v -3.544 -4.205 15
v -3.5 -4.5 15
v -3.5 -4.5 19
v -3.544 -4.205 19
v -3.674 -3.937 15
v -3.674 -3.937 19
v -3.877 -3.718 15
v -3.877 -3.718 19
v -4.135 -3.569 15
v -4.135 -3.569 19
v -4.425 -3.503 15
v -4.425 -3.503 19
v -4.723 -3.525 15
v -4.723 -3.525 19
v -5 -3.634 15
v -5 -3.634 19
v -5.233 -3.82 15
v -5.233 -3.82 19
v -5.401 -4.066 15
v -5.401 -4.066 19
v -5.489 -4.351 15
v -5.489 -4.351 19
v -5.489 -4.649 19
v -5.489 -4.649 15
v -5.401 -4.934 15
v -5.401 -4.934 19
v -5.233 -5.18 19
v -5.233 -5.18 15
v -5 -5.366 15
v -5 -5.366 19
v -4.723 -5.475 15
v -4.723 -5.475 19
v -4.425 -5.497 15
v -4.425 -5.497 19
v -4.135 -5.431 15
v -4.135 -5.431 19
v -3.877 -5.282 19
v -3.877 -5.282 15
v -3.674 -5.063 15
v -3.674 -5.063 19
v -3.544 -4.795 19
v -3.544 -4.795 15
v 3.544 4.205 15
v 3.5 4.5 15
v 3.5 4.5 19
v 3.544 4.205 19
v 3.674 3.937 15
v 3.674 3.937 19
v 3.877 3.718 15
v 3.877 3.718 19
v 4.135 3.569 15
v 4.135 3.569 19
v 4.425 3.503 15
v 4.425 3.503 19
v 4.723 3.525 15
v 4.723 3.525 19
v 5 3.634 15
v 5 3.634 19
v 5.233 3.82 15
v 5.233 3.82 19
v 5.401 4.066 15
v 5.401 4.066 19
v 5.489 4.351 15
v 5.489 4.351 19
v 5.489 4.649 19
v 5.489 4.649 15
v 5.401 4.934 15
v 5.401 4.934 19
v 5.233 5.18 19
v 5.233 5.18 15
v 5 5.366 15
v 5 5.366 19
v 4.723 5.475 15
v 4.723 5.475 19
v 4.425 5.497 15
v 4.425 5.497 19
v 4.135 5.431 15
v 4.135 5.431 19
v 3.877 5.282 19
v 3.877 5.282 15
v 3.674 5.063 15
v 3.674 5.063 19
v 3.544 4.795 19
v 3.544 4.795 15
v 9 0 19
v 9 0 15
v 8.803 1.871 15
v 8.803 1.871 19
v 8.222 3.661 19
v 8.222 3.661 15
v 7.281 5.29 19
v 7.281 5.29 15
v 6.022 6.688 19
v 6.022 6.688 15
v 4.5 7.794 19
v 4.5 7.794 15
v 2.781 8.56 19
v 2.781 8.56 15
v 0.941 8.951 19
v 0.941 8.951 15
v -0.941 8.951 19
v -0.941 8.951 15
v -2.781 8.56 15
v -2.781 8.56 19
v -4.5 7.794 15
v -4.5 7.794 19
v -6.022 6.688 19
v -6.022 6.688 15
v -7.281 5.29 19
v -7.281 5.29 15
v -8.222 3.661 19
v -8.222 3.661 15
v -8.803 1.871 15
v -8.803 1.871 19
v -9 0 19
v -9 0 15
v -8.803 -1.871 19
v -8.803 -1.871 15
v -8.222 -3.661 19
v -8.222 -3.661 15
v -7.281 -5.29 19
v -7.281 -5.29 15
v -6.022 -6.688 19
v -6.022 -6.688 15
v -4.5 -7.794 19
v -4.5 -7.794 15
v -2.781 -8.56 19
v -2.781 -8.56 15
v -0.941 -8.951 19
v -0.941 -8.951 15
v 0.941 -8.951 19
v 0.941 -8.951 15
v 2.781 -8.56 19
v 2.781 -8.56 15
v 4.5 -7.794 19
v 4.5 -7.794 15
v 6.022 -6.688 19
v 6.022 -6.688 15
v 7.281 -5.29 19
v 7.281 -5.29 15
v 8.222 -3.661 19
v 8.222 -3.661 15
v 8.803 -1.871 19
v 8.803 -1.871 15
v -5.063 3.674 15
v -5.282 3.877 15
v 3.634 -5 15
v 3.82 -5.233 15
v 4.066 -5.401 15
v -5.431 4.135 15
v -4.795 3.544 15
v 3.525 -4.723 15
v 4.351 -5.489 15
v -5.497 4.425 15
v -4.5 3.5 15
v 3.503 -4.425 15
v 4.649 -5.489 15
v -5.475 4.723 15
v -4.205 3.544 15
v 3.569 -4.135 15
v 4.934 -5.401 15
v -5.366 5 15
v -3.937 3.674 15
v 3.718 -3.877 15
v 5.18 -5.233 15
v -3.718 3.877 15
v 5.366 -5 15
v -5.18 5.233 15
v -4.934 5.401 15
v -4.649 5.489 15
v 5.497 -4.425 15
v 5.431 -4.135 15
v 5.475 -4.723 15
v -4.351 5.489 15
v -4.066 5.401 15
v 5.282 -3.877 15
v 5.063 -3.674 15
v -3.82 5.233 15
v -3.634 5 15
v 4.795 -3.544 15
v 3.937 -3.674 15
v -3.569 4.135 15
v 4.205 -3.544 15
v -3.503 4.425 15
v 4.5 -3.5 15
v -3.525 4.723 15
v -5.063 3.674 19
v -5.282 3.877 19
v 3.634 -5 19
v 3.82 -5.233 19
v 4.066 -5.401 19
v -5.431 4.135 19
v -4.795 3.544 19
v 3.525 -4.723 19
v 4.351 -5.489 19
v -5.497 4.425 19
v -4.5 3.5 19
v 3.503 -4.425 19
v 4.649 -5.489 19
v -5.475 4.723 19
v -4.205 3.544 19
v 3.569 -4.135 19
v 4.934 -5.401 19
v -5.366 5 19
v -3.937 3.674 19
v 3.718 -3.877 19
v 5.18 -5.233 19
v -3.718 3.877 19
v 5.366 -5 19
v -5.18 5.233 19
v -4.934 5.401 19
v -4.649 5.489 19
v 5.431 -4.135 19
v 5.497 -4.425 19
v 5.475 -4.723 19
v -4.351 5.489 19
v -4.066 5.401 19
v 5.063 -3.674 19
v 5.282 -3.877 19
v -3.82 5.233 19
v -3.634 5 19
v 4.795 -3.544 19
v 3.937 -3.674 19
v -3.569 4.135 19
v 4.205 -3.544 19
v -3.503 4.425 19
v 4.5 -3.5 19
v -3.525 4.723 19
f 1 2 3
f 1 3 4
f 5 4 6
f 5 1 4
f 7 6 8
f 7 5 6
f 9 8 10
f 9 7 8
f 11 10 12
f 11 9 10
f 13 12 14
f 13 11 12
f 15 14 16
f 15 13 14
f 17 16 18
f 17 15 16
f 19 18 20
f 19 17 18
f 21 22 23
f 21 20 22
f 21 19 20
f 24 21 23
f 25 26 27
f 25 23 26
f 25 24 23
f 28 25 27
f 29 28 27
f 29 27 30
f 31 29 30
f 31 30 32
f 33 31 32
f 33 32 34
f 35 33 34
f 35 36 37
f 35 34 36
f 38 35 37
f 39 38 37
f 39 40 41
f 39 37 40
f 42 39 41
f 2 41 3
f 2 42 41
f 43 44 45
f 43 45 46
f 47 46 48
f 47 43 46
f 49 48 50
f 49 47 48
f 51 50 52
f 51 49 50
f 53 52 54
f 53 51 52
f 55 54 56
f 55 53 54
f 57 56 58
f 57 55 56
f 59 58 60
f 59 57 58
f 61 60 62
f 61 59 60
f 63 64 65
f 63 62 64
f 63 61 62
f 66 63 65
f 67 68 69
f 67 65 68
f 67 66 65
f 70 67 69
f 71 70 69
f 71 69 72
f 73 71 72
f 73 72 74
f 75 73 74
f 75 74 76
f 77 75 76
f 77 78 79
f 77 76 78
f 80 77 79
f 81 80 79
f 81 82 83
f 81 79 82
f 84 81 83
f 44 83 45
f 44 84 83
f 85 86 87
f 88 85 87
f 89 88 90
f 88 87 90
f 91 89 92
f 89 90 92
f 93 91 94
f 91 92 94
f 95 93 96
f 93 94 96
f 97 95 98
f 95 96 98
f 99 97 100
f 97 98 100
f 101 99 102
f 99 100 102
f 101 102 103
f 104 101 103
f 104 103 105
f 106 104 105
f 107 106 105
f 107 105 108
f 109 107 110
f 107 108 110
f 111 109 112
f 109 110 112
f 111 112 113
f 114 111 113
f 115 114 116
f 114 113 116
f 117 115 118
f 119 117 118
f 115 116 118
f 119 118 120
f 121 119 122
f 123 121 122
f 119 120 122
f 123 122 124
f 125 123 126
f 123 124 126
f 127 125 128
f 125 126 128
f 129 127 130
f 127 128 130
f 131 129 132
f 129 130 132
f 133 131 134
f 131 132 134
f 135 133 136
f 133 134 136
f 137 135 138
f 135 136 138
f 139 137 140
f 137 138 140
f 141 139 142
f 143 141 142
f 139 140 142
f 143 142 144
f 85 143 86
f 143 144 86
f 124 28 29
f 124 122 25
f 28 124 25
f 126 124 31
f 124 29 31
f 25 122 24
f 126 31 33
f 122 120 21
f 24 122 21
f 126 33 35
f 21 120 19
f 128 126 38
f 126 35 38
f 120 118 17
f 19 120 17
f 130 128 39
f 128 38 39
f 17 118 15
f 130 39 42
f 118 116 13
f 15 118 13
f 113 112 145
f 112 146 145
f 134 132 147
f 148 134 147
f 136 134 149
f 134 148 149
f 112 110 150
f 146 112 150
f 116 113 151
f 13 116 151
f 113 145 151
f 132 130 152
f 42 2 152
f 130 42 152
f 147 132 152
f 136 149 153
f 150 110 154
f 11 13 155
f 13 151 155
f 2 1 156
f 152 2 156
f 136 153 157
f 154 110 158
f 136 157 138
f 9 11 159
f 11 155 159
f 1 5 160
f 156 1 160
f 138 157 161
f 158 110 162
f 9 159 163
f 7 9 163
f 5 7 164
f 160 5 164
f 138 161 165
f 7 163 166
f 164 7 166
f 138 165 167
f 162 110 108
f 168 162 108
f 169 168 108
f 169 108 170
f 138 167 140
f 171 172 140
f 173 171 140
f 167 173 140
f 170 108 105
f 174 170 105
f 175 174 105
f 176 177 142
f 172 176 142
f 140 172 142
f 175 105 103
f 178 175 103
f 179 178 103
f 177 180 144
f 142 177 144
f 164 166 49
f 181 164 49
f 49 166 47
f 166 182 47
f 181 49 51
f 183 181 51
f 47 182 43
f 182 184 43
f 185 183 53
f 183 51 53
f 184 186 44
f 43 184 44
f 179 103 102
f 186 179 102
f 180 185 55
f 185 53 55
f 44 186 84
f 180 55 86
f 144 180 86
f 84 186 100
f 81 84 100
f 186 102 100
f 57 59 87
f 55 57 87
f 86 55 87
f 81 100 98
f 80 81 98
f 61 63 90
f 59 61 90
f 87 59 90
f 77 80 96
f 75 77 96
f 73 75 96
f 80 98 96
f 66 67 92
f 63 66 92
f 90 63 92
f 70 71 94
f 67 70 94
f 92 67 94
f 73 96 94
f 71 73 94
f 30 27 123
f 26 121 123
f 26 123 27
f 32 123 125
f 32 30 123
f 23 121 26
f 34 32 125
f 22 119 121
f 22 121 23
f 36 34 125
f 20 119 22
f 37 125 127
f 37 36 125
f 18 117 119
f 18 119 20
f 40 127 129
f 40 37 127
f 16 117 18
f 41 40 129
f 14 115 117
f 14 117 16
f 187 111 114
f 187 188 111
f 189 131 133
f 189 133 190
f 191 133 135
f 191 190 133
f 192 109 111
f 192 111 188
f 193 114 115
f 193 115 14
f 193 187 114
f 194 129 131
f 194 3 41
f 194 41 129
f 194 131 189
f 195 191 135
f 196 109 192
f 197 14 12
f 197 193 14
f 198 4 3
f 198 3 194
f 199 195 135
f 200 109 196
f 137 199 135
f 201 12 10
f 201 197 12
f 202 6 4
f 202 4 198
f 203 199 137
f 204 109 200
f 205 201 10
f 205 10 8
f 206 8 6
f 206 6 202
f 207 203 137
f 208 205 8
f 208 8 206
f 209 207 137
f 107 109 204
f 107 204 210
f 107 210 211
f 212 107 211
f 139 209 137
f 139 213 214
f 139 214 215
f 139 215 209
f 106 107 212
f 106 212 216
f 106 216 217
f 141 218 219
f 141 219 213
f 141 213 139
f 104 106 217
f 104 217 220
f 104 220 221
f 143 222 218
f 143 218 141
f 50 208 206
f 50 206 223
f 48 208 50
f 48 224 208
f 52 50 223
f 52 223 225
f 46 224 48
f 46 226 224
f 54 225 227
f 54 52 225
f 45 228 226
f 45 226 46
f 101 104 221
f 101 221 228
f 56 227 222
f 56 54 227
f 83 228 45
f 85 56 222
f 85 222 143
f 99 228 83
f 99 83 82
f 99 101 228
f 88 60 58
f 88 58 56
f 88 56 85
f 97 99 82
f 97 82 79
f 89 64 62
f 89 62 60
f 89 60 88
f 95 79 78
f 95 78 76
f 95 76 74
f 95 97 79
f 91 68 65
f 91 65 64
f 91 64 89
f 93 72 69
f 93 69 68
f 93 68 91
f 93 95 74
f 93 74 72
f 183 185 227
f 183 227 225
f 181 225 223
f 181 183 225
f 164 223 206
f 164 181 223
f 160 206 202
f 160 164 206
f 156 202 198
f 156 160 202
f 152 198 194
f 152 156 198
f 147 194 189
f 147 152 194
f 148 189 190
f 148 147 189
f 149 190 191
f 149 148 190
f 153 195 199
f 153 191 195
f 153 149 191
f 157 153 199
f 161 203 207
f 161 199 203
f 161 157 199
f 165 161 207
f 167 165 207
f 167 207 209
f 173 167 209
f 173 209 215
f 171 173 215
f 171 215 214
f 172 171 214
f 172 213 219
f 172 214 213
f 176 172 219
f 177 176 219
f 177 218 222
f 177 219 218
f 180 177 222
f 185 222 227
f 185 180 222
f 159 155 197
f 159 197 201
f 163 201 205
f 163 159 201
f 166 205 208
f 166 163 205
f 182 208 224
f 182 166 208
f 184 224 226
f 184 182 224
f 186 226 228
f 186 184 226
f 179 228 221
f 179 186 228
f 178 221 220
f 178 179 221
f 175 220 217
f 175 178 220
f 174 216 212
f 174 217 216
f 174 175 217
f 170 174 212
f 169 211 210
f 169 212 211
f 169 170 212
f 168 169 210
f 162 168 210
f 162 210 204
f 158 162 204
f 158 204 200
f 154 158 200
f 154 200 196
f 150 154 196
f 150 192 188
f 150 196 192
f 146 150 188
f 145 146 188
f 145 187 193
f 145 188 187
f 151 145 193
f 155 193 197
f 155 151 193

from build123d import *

# Parameters (mm, degrees)
CYLINDER970_R     = 1
CYLINDER970_DEPTH = 20
CYLINDER971_R     = 1
CYLINDER971_DEPTH = 20
CYLINDER965_R     = 1
CYLINDER965_DEPTH = 20
CYLINDER972_R     = 1
CYLINDER972_DEPTH = 20
CYLINDER978_R     = 9
CYLINDER978_DEPTH = 4


with BuildPart() as v_lec970:
    # Cylinder970 → Cylinder970 (new body)
    with BuildSketch(Plane(origin=(4.5, -4.5, -88), x_dir=(0, 1, 0), z_dir=(0, 0, 1))):
        Circle(CYLINDER970_R)
    extrude(amount=CYLINDER970_DEPTH)


with BuildPart() as v_lec971:
    # Cylinder971 → Cylinder971 (new body)
    with BuildSketch(Plane(origin=(4.5, 4.5, -88), x_dir=(-1, 0, 0), z_dir=(0, 0, 1))):
        Circle(CYLINDER971_R)
    extrude(amount=CYLINDER971_DEPTH)


with BuildPart() as v_lec965:
    # Cylinder965 → Cylinder965 (new body)
    with BuildSketch(Plane(origin=(-4.5, 4.5, -88), x_dir=(0, -1, 0), z_dir=(0, 0, 1))):
        Circle(CYLINDER965_R)
    extrude(amount=CYLINDER965_DEPTH)


with BuildPart() as compound808:
    # Cylinder972 → Cylinder972 (new body)
    with BuildSketch(Plane(origin=(-4.5, -4.5, -88), x_dir=(1, 0, 0), z_dir=(0, 0, 1))):
        Circle(CYLINDER972_R)
    extrude(amount=CYLINDER972_DEPTH)

    # Compound808: union Válec970, Válec971, Válec965
    add(v_lec970.part)
    add(v_lec971.part)
    add(v_lec965.part)


with BuildPart() as compound808_1:
    # Compound808 placement: moved
    add(compound808.part.moved(Location((0, 0, 91))))


with BuildPart() as cut412:
    # Cylinder978 → Cylinder978 (new body)
    with BuildSketch(Plane.XY.offset(15)):
        Circle(CYLINDER978_R)
    extrude(amount=CYLINDER978_DEPTH)

    # Cut412: cut Compound808
    add(compound808_1.part, mode=Mode.SUBTRACT)


solid = cut412.part
